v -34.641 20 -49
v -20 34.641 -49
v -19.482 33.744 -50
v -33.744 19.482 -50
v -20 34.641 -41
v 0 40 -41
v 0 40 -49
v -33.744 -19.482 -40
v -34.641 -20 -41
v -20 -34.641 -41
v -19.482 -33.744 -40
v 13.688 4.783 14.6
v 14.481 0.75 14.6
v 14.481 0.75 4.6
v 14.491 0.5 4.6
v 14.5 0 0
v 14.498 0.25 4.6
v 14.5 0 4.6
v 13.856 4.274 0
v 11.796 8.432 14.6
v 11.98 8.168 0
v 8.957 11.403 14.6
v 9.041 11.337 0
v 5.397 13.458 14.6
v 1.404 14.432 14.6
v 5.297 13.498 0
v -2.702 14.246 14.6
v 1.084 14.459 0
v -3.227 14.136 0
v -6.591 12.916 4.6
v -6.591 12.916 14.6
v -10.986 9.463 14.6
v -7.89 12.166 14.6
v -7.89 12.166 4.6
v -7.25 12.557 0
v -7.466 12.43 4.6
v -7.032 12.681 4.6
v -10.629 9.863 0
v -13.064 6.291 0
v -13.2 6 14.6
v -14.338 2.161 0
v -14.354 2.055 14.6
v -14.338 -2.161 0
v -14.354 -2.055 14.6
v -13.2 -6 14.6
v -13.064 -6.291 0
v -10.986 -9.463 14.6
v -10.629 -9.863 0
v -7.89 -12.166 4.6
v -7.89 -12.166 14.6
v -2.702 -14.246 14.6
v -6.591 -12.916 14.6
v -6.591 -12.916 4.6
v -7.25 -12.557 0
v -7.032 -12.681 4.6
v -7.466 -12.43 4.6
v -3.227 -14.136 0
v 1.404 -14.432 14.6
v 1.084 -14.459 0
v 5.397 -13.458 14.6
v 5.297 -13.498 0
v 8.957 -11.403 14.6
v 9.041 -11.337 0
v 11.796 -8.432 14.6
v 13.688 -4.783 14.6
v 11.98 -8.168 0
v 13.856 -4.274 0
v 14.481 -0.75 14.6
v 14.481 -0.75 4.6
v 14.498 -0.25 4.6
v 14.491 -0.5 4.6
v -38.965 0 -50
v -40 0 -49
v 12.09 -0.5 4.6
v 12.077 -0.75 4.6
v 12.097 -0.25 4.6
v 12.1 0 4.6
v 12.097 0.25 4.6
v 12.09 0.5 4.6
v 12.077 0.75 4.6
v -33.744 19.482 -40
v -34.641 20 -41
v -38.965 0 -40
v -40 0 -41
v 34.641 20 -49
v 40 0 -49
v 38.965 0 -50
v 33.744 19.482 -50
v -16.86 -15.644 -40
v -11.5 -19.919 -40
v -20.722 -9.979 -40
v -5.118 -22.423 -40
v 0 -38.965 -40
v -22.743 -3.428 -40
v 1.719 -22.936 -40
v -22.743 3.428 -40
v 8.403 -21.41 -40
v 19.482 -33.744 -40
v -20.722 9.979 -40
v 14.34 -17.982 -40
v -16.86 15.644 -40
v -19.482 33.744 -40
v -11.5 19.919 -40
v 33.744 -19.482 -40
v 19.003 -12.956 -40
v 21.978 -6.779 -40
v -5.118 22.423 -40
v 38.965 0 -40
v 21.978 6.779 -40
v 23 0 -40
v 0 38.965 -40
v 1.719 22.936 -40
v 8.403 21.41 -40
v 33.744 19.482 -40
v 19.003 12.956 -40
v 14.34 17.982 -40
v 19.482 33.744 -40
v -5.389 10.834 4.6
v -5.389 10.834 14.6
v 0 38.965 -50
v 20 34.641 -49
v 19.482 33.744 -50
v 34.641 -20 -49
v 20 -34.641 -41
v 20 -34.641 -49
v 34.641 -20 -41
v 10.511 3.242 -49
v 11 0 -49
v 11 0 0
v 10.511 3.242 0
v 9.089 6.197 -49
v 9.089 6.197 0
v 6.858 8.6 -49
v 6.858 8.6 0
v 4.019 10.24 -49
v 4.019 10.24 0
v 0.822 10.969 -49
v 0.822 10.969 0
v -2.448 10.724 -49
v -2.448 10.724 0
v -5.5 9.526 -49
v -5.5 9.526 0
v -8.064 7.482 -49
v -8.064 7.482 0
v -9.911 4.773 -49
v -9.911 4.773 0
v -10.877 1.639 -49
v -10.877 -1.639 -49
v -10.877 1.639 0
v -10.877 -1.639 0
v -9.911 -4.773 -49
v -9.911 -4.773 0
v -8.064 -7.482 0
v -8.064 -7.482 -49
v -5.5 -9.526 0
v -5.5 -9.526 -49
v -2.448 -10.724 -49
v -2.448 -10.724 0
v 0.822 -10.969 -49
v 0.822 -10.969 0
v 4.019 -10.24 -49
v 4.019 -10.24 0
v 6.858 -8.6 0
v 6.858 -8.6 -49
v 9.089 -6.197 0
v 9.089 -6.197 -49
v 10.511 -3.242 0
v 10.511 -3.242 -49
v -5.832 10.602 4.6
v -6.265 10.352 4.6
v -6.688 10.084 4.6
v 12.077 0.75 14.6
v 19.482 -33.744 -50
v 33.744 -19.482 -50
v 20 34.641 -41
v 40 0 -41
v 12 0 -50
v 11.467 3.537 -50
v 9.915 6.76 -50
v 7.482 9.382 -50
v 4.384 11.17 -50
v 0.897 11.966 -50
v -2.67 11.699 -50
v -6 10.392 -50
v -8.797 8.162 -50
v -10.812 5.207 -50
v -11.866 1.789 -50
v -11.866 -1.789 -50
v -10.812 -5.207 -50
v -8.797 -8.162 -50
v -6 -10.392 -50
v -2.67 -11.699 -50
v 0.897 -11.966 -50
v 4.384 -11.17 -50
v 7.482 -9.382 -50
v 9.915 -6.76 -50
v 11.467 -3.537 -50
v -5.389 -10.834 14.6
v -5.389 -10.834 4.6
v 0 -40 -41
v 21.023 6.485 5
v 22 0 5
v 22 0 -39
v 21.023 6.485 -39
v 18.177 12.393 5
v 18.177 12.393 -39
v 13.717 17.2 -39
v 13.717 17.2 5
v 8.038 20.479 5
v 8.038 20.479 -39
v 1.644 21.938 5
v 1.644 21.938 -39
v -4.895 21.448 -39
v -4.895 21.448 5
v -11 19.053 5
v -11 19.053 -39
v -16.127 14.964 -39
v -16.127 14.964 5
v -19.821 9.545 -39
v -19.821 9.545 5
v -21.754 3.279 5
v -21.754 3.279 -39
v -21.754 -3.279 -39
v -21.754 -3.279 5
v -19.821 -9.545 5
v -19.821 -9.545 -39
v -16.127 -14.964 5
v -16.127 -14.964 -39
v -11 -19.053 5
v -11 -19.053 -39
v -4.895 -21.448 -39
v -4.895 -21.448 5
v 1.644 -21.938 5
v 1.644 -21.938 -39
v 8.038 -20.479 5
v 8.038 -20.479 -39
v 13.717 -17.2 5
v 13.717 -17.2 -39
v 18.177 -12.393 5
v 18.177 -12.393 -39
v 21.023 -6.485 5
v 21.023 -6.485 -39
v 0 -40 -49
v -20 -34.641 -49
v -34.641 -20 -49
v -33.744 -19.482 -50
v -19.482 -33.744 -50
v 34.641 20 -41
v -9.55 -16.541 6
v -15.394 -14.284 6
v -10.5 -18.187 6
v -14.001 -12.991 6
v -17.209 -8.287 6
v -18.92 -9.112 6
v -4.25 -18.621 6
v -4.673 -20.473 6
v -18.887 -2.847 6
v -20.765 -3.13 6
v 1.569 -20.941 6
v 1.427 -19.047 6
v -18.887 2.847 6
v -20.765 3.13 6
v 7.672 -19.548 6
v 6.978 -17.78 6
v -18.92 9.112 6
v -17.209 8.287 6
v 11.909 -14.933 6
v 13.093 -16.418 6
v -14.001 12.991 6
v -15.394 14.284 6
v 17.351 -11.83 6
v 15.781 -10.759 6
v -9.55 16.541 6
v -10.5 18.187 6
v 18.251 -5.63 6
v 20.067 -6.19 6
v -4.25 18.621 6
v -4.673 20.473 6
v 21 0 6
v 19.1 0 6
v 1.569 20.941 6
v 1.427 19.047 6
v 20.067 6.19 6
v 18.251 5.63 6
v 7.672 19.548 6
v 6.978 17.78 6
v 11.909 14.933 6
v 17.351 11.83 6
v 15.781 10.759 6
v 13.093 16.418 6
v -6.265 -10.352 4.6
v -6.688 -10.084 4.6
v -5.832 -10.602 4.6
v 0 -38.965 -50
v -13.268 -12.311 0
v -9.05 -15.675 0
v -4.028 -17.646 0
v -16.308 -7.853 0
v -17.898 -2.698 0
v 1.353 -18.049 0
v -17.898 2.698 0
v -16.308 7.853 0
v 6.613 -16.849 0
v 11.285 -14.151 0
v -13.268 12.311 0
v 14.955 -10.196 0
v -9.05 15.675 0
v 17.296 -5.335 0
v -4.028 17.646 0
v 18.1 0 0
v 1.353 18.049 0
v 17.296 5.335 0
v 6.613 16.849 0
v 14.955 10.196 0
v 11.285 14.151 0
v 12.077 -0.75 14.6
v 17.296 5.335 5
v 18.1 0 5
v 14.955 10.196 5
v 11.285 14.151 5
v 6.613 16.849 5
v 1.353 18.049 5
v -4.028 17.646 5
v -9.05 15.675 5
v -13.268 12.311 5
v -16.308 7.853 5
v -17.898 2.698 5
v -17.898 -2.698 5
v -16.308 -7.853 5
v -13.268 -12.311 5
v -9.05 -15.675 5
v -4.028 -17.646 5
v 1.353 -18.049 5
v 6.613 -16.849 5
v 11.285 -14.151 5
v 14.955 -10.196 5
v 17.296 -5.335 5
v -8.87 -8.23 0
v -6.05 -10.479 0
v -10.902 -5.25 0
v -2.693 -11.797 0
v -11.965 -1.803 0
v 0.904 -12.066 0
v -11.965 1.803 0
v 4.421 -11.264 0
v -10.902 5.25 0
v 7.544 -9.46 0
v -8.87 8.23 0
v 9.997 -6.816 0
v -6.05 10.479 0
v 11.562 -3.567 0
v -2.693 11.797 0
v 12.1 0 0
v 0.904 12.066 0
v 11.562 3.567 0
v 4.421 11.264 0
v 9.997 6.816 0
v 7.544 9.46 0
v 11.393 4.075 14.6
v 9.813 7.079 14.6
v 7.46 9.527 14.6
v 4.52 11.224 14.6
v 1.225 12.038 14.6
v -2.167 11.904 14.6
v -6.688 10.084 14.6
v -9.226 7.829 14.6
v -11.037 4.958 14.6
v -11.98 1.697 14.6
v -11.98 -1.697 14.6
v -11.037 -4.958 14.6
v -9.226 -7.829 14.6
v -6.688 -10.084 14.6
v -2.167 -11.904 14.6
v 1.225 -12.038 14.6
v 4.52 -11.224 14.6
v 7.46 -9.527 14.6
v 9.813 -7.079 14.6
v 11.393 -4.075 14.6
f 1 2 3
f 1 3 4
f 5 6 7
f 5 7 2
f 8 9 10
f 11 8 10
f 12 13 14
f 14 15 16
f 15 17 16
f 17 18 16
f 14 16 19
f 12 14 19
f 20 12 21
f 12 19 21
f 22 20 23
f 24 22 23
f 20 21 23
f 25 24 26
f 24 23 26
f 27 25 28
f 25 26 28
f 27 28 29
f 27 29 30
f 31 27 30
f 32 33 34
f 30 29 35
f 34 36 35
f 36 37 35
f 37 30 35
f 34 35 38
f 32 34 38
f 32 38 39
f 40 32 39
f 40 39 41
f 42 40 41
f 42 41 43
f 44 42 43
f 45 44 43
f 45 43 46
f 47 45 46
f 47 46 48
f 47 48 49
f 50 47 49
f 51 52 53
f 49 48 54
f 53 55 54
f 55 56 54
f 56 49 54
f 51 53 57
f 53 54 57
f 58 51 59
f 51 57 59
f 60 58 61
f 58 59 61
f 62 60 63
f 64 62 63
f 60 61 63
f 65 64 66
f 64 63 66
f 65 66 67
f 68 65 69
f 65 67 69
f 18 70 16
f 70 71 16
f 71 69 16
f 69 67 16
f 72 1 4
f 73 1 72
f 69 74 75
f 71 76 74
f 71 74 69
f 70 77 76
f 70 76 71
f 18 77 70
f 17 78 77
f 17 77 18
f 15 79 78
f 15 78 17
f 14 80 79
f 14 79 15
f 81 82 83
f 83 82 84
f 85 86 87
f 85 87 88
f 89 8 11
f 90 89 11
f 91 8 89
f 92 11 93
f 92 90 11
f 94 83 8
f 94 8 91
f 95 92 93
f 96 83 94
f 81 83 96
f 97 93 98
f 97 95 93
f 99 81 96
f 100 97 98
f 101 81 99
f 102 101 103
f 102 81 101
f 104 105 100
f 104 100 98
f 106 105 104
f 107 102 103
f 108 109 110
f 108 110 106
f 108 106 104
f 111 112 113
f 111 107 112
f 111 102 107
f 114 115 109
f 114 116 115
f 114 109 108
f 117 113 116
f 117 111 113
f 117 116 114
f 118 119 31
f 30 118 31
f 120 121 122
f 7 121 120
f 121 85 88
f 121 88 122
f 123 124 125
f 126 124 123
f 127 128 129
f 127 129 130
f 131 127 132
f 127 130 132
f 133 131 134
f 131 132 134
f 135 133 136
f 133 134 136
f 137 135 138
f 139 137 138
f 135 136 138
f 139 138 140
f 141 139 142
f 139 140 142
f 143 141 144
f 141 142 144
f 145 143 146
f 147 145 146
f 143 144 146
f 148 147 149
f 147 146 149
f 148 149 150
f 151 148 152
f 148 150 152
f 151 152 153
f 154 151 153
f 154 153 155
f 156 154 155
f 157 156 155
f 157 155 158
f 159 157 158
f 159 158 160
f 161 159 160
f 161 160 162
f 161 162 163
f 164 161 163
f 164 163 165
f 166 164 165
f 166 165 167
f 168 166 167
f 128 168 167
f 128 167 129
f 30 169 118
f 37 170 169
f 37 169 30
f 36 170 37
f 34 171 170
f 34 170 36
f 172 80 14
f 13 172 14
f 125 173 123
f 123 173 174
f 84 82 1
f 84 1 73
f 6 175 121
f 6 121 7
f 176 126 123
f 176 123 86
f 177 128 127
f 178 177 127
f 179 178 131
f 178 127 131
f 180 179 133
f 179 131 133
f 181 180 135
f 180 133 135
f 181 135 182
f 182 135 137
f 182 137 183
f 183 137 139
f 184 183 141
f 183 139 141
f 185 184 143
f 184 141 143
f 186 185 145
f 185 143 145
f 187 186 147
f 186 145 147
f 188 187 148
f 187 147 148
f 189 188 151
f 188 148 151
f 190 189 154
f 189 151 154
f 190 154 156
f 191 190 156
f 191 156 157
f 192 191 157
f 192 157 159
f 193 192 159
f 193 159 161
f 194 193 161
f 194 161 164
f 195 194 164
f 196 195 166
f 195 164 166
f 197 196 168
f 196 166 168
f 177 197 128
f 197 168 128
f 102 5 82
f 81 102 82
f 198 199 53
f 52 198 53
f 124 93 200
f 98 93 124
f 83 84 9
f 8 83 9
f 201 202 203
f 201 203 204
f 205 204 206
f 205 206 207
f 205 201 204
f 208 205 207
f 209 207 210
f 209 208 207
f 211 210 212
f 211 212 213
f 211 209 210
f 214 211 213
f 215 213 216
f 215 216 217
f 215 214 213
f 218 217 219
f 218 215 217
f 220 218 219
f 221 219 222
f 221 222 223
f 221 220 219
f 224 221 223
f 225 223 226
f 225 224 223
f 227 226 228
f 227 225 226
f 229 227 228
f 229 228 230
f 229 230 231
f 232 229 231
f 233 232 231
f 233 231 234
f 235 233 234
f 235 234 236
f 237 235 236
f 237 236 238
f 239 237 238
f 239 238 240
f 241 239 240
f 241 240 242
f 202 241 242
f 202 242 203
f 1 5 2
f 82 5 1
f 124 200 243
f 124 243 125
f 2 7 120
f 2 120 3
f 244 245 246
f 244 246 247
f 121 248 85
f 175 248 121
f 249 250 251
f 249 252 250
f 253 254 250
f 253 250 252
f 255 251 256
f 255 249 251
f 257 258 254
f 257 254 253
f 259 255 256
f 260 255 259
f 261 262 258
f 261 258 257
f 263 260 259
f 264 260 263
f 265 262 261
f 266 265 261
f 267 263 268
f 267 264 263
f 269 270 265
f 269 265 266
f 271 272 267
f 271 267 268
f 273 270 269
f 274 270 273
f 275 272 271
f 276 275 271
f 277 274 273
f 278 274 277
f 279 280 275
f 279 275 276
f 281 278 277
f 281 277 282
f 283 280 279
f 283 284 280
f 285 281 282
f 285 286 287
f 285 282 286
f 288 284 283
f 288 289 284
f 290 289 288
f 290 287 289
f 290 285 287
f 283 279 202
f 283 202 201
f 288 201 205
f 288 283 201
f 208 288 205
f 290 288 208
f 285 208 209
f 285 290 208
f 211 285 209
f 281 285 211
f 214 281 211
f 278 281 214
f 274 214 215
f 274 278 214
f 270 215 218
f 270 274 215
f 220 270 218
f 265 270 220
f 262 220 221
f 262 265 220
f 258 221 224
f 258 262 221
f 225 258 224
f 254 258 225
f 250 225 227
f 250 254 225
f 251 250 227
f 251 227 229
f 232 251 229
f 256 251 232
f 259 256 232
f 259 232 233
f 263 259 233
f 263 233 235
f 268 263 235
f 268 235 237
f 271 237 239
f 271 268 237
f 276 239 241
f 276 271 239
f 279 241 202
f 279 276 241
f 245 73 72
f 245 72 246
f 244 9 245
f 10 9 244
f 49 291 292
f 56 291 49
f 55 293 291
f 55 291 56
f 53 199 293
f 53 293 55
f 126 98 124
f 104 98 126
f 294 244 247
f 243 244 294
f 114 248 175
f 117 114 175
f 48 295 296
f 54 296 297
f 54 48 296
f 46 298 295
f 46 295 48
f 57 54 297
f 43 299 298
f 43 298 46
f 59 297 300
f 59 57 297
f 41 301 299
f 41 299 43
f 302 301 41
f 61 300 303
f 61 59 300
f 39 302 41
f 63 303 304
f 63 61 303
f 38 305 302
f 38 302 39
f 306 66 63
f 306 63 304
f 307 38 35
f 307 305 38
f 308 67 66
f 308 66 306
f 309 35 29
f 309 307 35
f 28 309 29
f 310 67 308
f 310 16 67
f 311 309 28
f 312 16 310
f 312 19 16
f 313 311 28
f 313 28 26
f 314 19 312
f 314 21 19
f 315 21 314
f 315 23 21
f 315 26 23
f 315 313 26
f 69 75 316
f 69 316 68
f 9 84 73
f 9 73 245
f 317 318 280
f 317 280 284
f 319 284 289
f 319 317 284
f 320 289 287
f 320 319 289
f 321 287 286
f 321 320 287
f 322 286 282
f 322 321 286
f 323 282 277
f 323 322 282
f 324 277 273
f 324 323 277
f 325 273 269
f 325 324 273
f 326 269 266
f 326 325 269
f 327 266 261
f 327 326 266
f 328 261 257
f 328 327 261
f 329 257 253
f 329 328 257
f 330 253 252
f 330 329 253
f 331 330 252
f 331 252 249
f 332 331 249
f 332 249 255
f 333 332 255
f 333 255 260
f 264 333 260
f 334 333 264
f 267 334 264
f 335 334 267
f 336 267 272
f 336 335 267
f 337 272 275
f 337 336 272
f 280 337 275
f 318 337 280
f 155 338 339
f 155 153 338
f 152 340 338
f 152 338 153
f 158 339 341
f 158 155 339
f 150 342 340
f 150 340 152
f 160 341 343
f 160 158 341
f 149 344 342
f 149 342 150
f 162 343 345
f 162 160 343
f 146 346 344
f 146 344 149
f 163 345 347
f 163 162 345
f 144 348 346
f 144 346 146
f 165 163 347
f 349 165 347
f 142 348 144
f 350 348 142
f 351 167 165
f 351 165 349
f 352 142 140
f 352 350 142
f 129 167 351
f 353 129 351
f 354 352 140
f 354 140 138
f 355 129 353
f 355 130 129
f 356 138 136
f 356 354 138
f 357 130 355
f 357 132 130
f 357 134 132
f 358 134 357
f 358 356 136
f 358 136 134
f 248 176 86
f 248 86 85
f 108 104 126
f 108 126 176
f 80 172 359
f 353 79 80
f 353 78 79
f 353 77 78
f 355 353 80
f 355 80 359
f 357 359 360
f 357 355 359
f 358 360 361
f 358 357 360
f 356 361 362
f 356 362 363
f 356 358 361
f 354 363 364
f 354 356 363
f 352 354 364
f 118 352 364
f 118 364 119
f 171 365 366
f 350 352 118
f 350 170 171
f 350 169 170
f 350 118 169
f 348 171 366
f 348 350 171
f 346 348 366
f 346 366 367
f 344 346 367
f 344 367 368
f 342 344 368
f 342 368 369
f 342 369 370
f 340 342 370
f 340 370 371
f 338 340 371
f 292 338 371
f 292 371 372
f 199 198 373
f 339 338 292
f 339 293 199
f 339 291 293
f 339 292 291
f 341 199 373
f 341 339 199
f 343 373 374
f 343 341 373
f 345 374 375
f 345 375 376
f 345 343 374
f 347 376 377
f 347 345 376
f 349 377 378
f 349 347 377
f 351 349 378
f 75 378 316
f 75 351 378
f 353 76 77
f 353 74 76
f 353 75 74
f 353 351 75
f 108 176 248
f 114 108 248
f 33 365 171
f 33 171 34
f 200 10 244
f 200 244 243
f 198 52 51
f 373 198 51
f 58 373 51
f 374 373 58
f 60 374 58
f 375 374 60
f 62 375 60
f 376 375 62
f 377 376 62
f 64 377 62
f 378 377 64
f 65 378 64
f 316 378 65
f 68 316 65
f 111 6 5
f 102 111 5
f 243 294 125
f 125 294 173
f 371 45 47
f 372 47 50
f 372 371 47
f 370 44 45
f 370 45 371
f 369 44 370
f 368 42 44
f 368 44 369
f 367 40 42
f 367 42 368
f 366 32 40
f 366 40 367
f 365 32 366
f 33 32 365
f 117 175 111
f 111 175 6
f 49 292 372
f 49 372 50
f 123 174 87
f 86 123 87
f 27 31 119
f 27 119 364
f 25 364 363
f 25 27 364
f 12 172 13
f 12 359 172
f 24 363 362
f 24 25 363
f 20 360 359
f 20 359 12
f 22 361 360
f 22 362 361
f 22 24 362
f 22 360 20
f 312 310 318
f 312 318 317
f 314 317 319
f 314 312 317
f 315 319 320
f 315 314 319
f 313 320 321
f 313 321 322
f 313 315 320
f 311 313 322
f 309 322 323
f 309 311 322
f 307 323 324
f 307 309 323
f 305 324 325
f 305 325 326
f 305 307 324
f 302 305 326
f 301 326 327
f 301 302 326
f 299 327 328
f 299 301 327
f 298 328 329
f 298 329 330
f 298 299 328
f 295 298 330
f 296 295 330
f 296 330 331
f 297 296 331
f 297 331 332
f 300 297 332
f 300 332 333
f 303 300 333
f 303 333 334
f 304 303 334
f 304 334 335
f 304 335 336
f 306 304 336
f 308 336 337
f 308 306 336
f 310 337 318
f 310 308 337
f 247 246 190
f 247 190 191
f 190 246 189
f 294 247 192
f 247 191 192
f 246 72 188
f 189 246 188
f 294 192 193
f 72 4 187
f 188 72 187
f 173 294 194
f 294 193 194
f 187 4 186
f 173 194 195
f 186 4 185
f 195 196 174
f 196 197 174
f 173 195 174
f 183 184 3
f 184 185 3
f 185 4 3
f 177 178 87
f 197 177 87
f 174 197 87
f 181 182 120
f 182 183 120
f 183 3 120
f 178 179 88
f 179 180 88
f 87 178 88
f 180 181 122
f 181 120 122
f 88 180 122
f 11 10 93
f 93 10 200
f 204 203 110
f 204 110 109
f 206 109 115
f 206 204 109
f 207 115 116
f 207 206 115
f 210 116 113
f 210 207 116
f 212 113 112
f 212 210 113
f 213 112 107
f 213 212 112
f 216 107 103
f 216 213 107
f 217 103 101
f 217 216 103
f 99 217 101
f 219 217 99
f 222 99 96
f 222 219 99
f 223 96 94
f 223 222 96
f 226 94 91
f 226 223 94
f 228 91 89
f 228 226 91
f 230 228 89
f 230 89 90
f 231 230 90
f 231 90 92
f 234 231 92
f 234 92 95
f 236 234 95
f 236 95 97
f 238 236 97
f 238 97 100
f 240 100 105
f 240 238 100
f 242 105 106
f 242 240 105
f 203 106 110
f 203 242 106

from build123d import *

# Parameters (mm, degrees)
SKETCH_R             = 14.5
SKETCH_R_2           = 12.1
PAD_DEPTH            = 14.6
SKETCH001_W          = 30.380329
SKETCH001_H          = 1.5
POCKET_DEPTH         = 97.067871
POLARPATTERN_COUNT   = 3
SKETCH003_R          = 22
PAD001_DEPTH         = 40
SKETCH004_R          = 22
SKETCH004_R_2        = 18.1
PAD002_DEPTH         = 6
PAD003_DEPTH         = 10
SKETCH005_R          = 11
POCKET001_DEPTH      = 50.001
POCKET001_DEPTH_BACK = 14.601
CHAMFER_SIZE         = 1


with BuildPart() as part:
    # Sketch → Pad (new body)
    with BuildSketch(Plane.XY):
        Circle(SKETCH_R)
        Circle(SKETCH_R_2, mode=Mode.SUBTRACT)
    extrude(amount=PAD_DEPTH)

    # Sketch001 → Pocket (cut, through all)
    with BuildSketch(Plane.XY.offset(4.6)):
        with Locations((15.190164, 0)):
            Rectangle(SKETCH001_W, SKETCH001_H)
    pocket = extrude(amount=POCKET_DEPTH, mode=Mode.SUBTRACT)

    # PolarPattern: Pocket ×3 about axis
    polarpattern_axis = Axis((0, 0, 4.6), (0, 0, 1))
    for i in range(1, POLARPATTERN_COUNT):
        add(pocket.rotate(polarpattern_axis, i * 360 / POLARPATTERN_COUNT), mode=Mode.SUBTRACT)

    # Sketch003 → Pad001 (join)
    with BuildSketch(Plane.XY):
        Circle(SKETCH003_R)
    extrude(amount=-PAD001_DEPTH)

    # Sketch004 → Pad002 (join)
    with BuildSketch(Plane.XY):
        Circle(SKETCH004_R)
        Circle(SKETCH004_R_2, mode=Mode.SUBTRACT)
    extrude(amount=PAD002_DEPTH)

    # Sketch002 → Pad003 (join)
    with BuildSketch(Plane.XY.offset(-40)):
        Polygon((20, -34.641016), (34.641016, -20), (40, 0), (34.641016, 20), (20, 34.641016), (0, 40), (-20, 34.641016), (-34.641016, 20), (-40, 0), (-34.641016, -20), (-20, -34.641016), (0, -40), align=None)
    extrude(amount=-PAD003_DEPTH)

    # Sketch005 → Pocket001 (cut, two sides)
    with BuildSketch(Plane.XY) as pocket001_sk:
        Circle(SKETCH005_R)
    extrude(amount=-POCKET001_DEPTH, mode=Mode.SUBTRACT)
    extrude(pocket001_sk.sketch, amount=POCKET001_DEPTH_BACK, mode=Mode.SUBTRACT)

    # Chamfer
    chamfer_edges = [part.edges().sort_by_distance(p)[0] for p in [
        (27.320508, -27.320508, -50),
        (10, -37.320508, -50),
        (37.320508, -10, -50),
        (-10, -37.320508, -50),
        (37.320508, 10, -50),
        (-27.320508, -27.320508, -50),
        (27.320508, 27.320508, -50),
        (-37.320508, -10, -50),
        (10, 37.320508, -50),
        (-37.320508, 10, -50),
        (-10, 37.320508, -50),
        (-27.320508, 27.320508, -50),
        (-11, 0, -50),
        (27.320508, -27.320508, -40),
        (10, -37.320508, -40),
        (37.320508, -10, -40),
        (-10, -37.320508, -40),
        (37.320508, 10, -40),
        (-27.320508, -27.320508, -40),
        (27.320508, 27.320508, -40),
        (-37.320508, -10, -40),
        (10, 37.320508, -40),
        (-37.320508, 10, -40),
        (-10, 37.320508, -40),
        (-27.320508, 27.320508, -40),
        (-22, 0, -40),
        (-22, 0, 6),
        (-18.1, 0, 6),
    ]]
    chamfer(chamfer_edges, length=CHAMFER_SIZE)


solid = part.part
